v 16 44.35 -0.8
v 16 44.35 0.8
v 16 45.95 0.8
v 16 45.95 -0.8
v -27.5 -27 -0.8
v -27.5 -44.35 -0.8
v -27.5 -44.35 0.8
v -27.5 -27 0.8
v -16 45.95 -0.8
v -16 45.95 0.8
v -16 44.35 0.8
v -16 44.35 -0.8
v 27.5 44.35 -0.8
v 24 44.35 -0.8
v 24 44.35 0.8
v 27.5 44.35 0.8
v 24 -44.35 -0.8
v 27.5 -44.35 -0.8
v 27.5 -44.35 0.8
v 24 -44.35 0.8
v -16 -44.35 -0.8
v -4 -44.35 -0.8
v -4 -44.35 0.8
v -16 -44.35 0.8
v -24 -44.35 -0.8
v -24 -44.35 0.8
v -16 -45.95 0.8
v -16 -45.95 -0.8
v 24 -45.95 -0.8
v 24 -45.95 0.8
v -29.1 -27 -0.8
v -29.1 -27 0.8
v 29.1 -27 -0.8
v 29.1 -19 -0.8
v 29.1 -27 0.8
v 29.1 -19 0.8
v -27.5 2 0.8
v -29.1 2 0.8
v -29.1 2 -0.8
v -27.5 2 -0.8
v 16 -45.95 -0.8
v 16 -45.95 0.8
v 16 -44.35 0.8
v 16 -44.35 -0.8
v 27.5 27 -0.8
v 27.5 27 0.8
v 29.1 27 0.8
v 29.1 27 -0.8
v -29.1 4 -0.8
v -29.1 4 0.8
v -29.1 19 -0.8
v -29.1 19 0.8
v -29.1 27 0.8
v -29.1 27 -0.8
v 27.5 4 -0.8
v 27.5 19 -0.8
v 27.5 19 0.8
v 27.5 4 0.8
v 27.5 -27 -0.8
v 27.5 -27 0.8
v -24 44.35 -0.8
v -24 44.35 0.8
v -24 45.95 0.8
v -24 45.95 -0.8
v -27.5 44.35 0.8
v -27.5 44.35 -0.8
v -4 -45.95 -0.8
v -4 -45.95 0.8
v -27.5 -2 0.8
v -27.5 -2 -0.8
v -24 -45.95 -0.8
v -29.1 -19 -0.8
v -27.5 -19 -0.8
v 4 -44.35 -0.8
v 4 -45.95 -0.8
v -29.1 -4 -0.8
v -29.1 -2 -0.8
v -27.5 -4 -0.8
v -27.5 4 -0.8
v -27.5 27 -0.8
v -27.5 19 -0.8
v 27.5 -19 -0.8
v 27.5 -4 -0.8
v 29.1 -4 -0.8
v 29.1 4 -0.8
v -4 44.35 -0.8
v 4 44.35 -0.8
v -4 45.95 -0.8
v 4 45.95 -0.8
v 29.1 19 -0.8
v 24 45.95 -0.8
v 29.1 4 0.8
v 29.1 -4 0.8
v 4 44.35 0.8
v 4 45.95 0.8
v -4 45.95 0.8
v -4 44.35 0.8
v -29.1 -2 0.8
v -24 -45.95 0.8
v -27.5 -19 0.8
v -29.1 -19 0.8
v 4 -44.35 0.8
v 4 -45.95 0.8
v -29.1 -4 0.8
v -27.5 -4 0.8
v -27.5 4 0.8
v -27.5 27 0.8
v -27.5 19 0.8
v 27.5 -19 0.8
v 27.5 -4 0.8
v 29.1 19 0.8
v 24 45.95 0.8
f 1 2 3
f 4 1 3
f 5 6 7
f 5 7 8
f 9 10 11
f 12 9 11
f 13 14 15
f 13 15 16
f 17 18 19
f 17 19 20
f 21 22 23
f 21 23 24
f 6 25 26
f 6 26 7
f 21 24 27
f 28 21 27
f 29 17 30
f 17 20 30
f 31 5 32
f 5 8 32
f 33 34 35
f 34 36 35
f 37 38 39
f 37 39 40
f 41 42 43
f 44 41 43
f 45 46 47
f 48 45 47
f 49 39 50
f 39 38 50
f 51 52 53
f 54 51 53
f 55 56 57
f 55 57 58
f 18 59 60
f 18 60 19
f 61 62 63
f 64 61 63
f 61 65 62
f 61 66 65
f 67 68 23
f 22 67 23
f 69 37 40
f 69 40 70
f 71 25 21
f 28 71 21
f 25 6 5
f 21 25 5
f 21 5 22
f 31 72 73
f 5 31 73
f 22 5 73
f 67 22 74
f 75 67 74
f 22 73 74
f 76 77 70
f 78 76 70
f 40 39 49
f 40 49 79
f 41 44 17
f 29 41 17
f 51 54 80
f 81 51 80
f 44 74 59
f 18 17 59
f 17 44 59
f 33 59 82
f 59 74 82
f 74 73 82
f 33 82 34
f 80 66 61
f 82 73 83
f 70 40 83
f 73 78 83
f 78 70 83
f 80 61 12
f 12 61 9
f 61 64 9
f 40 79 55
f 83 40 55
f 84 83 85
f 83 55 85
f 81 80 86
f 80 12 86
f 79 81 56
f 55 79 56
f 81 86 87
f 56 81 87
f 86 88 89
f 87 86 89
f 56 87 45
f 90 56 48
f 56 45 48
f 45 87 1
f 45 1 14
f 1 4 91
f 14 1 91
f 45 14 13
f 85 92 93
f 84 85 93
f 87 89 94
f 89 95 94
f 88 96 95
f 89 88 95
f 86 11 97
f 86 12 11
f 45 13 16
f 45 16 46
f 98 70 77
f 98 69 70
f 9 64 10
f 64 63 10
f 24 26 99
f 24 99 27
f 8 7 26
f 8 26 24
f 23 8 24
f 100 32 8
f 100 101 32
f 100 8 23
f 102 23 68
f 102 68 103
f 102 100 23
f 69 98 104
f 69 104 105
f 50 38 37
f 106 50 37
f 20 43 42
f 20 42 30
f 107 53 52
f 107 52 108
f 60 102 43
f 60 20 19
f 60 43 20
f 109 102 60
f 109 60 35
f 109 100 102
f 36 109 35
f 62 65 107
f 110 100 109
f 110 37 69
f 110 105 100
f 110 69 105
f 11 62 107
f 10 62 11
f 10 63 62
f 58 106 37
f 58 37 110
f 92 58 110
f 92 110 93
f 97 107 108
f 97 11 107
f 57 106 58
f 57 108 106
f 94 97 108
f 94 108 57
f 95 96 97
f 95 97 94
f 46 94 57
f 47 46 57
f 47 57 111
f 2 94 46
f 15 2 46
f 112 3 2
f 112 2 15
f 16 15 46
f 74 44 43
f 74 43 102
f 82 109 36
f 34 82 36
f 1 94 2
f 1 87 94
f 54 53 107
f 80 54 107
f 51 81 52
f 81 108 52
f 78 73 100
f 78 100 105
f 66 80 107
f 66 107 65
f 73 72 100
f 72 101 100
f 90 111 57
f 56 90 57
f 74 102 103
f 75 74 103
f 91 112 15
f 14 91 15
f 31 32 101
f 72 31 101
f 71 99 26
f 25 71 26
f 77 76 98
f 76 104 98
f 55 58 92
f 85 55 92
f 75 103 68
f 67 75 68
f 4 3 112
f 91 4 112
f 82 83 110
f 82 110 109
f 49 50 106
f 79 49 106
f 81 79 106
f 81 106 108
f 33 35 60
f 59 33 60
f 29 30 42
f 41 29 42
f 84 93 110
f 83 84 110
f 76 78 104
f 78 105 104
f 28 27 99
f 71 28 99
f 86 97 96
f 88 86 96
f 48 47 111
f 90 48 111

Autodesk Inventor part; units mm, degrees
ref_plane "YZ Plane" through (0, 0, 0) normal (1, 0, 0) x (0, 1, 0)
ref_plane "XZ Plane" through (0, 0, 0) normal (0, 1, 0) x (-1, 0, 0)
ref_plane "XY Plane" through (0, 0, 0) normal (0, 0, 1) x (1, 0, 0)
sketch "Sketch1" plane through (0, 0, 0) normal (0, 0, 1) x (1, 0, 0)
  line L0 (0, 62.09) -> (0, -62.09) construction
  line L1 (-38.5, 0) -> (38.5, 0) construction
  line L2 (27.5, -44.35) -> (-27.5, -44.35)
  line L3 (-27.5, -44.35) -> (-27.5, 44.35)
  line L4 (-27.5, 44.35) -> (27.5, 44.35)
  line L5 (27.5, 44.35) -> (27.5, -44.35)
  line L6 (27.5, -44.35) -> (-27.5, 44.35) construction
  line L7 (-27.5, -44.35) -> (27.5, 44.35) construction
  point P0 (0, 0)
  dimension "d0" = 55
  dimension "d1" = 88.7
extrude "Extrusion1" add sketch "Sketch1" along normal mid plane 1.6
sketch "Esquisse2" plane through (0, 0, 0.8) normal (0, 0, 1) x (1, 0, 0)
  line L0 (-27.5, -44.35) -> (27.5, -44.35) construction
  line L1 (27.5, -44.35) -> (27.5, 44.35) construction
  line L2 (27.5, 44.35) -> (-27.5, 44.35) construction
  line L3 (-27.5, 44.35) -> (-27.5, -44.35) construction
  line L4 (0, 62.09) -> (0, -62.09) construction
  line L5 (-40.42, 0) -> (38.82, 0) construction
  line L6 (-27.5, -27) -> (-29.1, -27)
  line L7 (-29.1, -27) -> (-29.1, -19)
  line L8 (-29.1, -19) -> (-27.5, -19)
  line L9 (-27.5, -19) -> (-27.5, -27)
  line L10 (-27.5, -4) -> (-29.1, -4)
  line L11 (-29.1, -4) -> (-29.1, 4)
  line L12 (-29.1, 4) -> (-27.5, 4)
  line L13 (-27.5, 4) -> (-27.5, -4)
  line L14 (-27.5, 19) -> (-29.1, 19)
  line L15 (-29.1, 19) -> (-29.1, 27)
  line L16 (-29.1, 27) -> (-27.5, 27)
  line L17 (-27.5, 27) -> (-27.5, 19)
  point P0 (0, 0)
  dimension "d4" = 1.6
  dimension "d5" = 8
  dimension "d8" = 23
extrude "Extrusion2" add sketch "Esquisse2" against normal blind 1.6
mirror "Symétrie1" about plane through (0, 0, 0) normal (1, 0, 0) of "Extrusion2"
sketch "Esquisse3" plane through (0, 0, 0.8) normal (0, 0, 1) x (1, 0, 0)
  line L0 (-29.1, 27) -> (-27.5, 27) construction
  line L1 (-27.5, 27) -> (-27.5, 44.35) construction
  line L2 (-27.5, 44.35) -> (27.5, 44.35) construction
  line L3 (27.5, 44.35) -> (27.5, 27) construction
  line L4 (27.5, 27) -> (29.1, 27) construction
  line L5 (29.1, 27) -> (29.1, 19) construction
  line L6 (29.1, 19) -> (27.5, 19) construction
  line L7 (27.5, 19) -> (27.5, 4) construction
  line L8 (27.5, 4) -> (29.1, 4) construction
  line L9 (29.1, 4) -> (29.1, -4) construction
  line L10 (29.1, -4) -> (27.5, -4) construction
  line L11 (27.5, -4) -> (27.5, -19) construction
  line L12 (27.5, -19) -> (29.1, -19) construction
  line L13 (29.1, -19) -> (29.1, -27) construction
  line L14 (29.1, -27) -> (27.5, -27) construction
  line L15 (27.5, -27) -> (27.5, -44.35) construction
  line L16 (27.5, -44.35) -> (-27.5, -44.35) construction
  line L17 (-27.5, -44.35) -> (-27.5, -27) construction
  line L18 (-27.5, -27) -> (-29.1, -27) construction
  line L19 (-29.1, -27) -> (-29.1, -19) construction
  line L20 (-29.1, -19) -> (-27.5, -19) construction
  line L21 (-27.5, -19) -> (-27.5, -4) construction
  line L22 (-27.5, -4) -> (-29.1, -4) construction
  line L23 (-29.1, -4) -> (-29.1, 4) construction
  line L24 (-29.1, 4) -> (-27.5, 4) construction
  line L25 (-27.5, 4) -> (-27.5, 19) construction
  line L26 (-27.5, 19) -> (-29.1, 19) construction
  line L27 (-29.1, 19) -> (-29.1, 27) construction
  line L28 (0, 62.09) -> (0, -62.09) construction
  line L29 (-40.74, 0) -> (40.74, 0) construction
  line L30 (-27.5, -44.35) -> (27.5, -44.35) construction
  line L31 (27.5, -44.35) -> (27.5, -27) construction
  line L32 (27.5, -27) -> (29.1, -27) construction
  line L33 (29.1, -27) -> (29.1, -19) construction
  line L34 (29.1, -19) -> (27.5, -19) construction
  line L35 (27.5, -19) -> (27.5, -4) construction
  line L36 (27.5, -4) -> (29.1, -4) construction
  line L37 (29.1, -4) -> (29.1, 4) construction
  line L38 (29.1, 4) -> (27.5, 4) construction
  line L39 (27.5, 4) -> (27.5, 19) construction
  line L40 (27.5, 19) -> (29.1, 19) construction
  line L41 (29.1, 19) -> (29.1, 27) construction
  line L42 (29.1, 27) -> (27.5, 27) construction
  line L43 (27.5, 27) -> (27.5, 44.35) construction
  line L44 (27.5, 44.35) -> (-27.5, 44.35) construction
  line L45 (-27.5, 44.35) -> (-27.5, 27) construction
  line L46 (-29.1, 27) -> (-27.5, 27) construction
  line L47 (-29.1, 19) -> (-29.1, 27) construction
  line L48 (-27.5, 19) -> (-29.1, 19) construction
  line L49 (-27.5, 19) -> (-27.5, 4) construction
  line L50 (-29.1, 4) -> (-27.5, 4) construction
  line L51 (-29.1, -4) -> (-29.1, 4) construction
  line L52 (-27.5, -4) -> (-29.1, -4) construction
  line L53 (-27.5, -4) -> (-27.5, -19) construction
  line L54 (-29.1, -19) -> (-27.5, -19) construction
  line L55 (-29.1, -27) -> (-29.1, -19) construction
  line L56 (-27.5, -27) -> (-29.1, -27) construction
  line L57 (-27.5, -27) -> (-27.5, -44.35) construction
  line L58 (24, 44.35) -> (16, 44.35)
  line L59 (16, 44.35) -> (16, 45.95)
  line L60 (16, 45.95) -> (24, 45.95)
  line L61 (24, 45.95) -> (24, 44.35)
  line L62 (4, 44.35) -> (-4, 44.35)
  line L63 (-4, 45.95) -> (4, 45.95)
  line L64 (4, 45.95) -> (4, 44.35)
  line L65 (-4, 44.35) -> (-4, 45.95)
  line L66 (-16, 44.35) -> (-24, 44.35)
  line L67 (-24, 45.95) -> (-16, 45.95)
  line L68 (-16, 45.95) -> (-16, 44.35)
  line L69 (-24, 44.35) -> (-24, 45.95)
  point P0 (0, 0)
  dimension "d15" = 8
  dimension "d16" = 1.6
  dimension "d19" = 20
extrude "Extrusion3" add sketch "Esquisse3" against normal blind 1.6
mirror "Symétrie2" about plane through (0, 0, 0) normal (0, 1, 0) of "Extrusion3"
sketch "Esquisse4" plane through (-29.1, -4, 0.8) normal (-1, 0, 0) x (0, 0, 1)
  point P0 (-0.8, 4)
sketch "Esquisse5" plane through (0, 0, 0.8) normal (0, 0, 1) x (1, 0, 0)
  line L0 (-27.5, 31) -> (-29.1, 31)
  line L1 (-29.1, 31) -> (-29.1, 2)
  line L2 (-29.1, 2) -> (-27.5, 2)
  line L3 (-27.5, 2) -> (-27.5, -2)
  line L4 (-27.5, -2) -> (-29.1, -2)
  line L5 (-29.1, -2) -> (-29.1, -31)
  line L6 (-29.1, -31) -> (-27.5, -31)
  line L7 (-27.5, -31) -> (-27.5, -39)
  line L8 (-27.5, -39) -> (-29.1, -39)
  line L9 (-29.1, -39) -> (-29.1, -44.35)
  line L10 (-29.1, -44.35) -> (-32.6, -44.35)
  line L11 (-32.6, -44.35) -> (-32.6, -45.95)
  line L12 (-32.6, -45.95) -> (-40.6, -45.95)
  line L13 (-40.6, -45.95) -> (-40.6, -44.35)
  line L14 (-40.6, -44.35) -> (-44.1, -44.35)
  line L15 (-44.1, -44.35) -> (-44.1, 44.35)
  line L16 (-44.1, 44.35) -> (-29.1, 44.35)
  line L17 (-29.1, 44.35) -> (-29.1, 39)
  line L18 (-29.1, 39) -> (-27.5, 39)
  line L19 (-27.5, 39) -> (-27.5, 31)
  point P0 (0, 0)
extrude "Extrusion4" cut sketch "Esquisse5" against normal blind 1.6
properties part number "BaseSupportBatterie1" material "PVC-U"
